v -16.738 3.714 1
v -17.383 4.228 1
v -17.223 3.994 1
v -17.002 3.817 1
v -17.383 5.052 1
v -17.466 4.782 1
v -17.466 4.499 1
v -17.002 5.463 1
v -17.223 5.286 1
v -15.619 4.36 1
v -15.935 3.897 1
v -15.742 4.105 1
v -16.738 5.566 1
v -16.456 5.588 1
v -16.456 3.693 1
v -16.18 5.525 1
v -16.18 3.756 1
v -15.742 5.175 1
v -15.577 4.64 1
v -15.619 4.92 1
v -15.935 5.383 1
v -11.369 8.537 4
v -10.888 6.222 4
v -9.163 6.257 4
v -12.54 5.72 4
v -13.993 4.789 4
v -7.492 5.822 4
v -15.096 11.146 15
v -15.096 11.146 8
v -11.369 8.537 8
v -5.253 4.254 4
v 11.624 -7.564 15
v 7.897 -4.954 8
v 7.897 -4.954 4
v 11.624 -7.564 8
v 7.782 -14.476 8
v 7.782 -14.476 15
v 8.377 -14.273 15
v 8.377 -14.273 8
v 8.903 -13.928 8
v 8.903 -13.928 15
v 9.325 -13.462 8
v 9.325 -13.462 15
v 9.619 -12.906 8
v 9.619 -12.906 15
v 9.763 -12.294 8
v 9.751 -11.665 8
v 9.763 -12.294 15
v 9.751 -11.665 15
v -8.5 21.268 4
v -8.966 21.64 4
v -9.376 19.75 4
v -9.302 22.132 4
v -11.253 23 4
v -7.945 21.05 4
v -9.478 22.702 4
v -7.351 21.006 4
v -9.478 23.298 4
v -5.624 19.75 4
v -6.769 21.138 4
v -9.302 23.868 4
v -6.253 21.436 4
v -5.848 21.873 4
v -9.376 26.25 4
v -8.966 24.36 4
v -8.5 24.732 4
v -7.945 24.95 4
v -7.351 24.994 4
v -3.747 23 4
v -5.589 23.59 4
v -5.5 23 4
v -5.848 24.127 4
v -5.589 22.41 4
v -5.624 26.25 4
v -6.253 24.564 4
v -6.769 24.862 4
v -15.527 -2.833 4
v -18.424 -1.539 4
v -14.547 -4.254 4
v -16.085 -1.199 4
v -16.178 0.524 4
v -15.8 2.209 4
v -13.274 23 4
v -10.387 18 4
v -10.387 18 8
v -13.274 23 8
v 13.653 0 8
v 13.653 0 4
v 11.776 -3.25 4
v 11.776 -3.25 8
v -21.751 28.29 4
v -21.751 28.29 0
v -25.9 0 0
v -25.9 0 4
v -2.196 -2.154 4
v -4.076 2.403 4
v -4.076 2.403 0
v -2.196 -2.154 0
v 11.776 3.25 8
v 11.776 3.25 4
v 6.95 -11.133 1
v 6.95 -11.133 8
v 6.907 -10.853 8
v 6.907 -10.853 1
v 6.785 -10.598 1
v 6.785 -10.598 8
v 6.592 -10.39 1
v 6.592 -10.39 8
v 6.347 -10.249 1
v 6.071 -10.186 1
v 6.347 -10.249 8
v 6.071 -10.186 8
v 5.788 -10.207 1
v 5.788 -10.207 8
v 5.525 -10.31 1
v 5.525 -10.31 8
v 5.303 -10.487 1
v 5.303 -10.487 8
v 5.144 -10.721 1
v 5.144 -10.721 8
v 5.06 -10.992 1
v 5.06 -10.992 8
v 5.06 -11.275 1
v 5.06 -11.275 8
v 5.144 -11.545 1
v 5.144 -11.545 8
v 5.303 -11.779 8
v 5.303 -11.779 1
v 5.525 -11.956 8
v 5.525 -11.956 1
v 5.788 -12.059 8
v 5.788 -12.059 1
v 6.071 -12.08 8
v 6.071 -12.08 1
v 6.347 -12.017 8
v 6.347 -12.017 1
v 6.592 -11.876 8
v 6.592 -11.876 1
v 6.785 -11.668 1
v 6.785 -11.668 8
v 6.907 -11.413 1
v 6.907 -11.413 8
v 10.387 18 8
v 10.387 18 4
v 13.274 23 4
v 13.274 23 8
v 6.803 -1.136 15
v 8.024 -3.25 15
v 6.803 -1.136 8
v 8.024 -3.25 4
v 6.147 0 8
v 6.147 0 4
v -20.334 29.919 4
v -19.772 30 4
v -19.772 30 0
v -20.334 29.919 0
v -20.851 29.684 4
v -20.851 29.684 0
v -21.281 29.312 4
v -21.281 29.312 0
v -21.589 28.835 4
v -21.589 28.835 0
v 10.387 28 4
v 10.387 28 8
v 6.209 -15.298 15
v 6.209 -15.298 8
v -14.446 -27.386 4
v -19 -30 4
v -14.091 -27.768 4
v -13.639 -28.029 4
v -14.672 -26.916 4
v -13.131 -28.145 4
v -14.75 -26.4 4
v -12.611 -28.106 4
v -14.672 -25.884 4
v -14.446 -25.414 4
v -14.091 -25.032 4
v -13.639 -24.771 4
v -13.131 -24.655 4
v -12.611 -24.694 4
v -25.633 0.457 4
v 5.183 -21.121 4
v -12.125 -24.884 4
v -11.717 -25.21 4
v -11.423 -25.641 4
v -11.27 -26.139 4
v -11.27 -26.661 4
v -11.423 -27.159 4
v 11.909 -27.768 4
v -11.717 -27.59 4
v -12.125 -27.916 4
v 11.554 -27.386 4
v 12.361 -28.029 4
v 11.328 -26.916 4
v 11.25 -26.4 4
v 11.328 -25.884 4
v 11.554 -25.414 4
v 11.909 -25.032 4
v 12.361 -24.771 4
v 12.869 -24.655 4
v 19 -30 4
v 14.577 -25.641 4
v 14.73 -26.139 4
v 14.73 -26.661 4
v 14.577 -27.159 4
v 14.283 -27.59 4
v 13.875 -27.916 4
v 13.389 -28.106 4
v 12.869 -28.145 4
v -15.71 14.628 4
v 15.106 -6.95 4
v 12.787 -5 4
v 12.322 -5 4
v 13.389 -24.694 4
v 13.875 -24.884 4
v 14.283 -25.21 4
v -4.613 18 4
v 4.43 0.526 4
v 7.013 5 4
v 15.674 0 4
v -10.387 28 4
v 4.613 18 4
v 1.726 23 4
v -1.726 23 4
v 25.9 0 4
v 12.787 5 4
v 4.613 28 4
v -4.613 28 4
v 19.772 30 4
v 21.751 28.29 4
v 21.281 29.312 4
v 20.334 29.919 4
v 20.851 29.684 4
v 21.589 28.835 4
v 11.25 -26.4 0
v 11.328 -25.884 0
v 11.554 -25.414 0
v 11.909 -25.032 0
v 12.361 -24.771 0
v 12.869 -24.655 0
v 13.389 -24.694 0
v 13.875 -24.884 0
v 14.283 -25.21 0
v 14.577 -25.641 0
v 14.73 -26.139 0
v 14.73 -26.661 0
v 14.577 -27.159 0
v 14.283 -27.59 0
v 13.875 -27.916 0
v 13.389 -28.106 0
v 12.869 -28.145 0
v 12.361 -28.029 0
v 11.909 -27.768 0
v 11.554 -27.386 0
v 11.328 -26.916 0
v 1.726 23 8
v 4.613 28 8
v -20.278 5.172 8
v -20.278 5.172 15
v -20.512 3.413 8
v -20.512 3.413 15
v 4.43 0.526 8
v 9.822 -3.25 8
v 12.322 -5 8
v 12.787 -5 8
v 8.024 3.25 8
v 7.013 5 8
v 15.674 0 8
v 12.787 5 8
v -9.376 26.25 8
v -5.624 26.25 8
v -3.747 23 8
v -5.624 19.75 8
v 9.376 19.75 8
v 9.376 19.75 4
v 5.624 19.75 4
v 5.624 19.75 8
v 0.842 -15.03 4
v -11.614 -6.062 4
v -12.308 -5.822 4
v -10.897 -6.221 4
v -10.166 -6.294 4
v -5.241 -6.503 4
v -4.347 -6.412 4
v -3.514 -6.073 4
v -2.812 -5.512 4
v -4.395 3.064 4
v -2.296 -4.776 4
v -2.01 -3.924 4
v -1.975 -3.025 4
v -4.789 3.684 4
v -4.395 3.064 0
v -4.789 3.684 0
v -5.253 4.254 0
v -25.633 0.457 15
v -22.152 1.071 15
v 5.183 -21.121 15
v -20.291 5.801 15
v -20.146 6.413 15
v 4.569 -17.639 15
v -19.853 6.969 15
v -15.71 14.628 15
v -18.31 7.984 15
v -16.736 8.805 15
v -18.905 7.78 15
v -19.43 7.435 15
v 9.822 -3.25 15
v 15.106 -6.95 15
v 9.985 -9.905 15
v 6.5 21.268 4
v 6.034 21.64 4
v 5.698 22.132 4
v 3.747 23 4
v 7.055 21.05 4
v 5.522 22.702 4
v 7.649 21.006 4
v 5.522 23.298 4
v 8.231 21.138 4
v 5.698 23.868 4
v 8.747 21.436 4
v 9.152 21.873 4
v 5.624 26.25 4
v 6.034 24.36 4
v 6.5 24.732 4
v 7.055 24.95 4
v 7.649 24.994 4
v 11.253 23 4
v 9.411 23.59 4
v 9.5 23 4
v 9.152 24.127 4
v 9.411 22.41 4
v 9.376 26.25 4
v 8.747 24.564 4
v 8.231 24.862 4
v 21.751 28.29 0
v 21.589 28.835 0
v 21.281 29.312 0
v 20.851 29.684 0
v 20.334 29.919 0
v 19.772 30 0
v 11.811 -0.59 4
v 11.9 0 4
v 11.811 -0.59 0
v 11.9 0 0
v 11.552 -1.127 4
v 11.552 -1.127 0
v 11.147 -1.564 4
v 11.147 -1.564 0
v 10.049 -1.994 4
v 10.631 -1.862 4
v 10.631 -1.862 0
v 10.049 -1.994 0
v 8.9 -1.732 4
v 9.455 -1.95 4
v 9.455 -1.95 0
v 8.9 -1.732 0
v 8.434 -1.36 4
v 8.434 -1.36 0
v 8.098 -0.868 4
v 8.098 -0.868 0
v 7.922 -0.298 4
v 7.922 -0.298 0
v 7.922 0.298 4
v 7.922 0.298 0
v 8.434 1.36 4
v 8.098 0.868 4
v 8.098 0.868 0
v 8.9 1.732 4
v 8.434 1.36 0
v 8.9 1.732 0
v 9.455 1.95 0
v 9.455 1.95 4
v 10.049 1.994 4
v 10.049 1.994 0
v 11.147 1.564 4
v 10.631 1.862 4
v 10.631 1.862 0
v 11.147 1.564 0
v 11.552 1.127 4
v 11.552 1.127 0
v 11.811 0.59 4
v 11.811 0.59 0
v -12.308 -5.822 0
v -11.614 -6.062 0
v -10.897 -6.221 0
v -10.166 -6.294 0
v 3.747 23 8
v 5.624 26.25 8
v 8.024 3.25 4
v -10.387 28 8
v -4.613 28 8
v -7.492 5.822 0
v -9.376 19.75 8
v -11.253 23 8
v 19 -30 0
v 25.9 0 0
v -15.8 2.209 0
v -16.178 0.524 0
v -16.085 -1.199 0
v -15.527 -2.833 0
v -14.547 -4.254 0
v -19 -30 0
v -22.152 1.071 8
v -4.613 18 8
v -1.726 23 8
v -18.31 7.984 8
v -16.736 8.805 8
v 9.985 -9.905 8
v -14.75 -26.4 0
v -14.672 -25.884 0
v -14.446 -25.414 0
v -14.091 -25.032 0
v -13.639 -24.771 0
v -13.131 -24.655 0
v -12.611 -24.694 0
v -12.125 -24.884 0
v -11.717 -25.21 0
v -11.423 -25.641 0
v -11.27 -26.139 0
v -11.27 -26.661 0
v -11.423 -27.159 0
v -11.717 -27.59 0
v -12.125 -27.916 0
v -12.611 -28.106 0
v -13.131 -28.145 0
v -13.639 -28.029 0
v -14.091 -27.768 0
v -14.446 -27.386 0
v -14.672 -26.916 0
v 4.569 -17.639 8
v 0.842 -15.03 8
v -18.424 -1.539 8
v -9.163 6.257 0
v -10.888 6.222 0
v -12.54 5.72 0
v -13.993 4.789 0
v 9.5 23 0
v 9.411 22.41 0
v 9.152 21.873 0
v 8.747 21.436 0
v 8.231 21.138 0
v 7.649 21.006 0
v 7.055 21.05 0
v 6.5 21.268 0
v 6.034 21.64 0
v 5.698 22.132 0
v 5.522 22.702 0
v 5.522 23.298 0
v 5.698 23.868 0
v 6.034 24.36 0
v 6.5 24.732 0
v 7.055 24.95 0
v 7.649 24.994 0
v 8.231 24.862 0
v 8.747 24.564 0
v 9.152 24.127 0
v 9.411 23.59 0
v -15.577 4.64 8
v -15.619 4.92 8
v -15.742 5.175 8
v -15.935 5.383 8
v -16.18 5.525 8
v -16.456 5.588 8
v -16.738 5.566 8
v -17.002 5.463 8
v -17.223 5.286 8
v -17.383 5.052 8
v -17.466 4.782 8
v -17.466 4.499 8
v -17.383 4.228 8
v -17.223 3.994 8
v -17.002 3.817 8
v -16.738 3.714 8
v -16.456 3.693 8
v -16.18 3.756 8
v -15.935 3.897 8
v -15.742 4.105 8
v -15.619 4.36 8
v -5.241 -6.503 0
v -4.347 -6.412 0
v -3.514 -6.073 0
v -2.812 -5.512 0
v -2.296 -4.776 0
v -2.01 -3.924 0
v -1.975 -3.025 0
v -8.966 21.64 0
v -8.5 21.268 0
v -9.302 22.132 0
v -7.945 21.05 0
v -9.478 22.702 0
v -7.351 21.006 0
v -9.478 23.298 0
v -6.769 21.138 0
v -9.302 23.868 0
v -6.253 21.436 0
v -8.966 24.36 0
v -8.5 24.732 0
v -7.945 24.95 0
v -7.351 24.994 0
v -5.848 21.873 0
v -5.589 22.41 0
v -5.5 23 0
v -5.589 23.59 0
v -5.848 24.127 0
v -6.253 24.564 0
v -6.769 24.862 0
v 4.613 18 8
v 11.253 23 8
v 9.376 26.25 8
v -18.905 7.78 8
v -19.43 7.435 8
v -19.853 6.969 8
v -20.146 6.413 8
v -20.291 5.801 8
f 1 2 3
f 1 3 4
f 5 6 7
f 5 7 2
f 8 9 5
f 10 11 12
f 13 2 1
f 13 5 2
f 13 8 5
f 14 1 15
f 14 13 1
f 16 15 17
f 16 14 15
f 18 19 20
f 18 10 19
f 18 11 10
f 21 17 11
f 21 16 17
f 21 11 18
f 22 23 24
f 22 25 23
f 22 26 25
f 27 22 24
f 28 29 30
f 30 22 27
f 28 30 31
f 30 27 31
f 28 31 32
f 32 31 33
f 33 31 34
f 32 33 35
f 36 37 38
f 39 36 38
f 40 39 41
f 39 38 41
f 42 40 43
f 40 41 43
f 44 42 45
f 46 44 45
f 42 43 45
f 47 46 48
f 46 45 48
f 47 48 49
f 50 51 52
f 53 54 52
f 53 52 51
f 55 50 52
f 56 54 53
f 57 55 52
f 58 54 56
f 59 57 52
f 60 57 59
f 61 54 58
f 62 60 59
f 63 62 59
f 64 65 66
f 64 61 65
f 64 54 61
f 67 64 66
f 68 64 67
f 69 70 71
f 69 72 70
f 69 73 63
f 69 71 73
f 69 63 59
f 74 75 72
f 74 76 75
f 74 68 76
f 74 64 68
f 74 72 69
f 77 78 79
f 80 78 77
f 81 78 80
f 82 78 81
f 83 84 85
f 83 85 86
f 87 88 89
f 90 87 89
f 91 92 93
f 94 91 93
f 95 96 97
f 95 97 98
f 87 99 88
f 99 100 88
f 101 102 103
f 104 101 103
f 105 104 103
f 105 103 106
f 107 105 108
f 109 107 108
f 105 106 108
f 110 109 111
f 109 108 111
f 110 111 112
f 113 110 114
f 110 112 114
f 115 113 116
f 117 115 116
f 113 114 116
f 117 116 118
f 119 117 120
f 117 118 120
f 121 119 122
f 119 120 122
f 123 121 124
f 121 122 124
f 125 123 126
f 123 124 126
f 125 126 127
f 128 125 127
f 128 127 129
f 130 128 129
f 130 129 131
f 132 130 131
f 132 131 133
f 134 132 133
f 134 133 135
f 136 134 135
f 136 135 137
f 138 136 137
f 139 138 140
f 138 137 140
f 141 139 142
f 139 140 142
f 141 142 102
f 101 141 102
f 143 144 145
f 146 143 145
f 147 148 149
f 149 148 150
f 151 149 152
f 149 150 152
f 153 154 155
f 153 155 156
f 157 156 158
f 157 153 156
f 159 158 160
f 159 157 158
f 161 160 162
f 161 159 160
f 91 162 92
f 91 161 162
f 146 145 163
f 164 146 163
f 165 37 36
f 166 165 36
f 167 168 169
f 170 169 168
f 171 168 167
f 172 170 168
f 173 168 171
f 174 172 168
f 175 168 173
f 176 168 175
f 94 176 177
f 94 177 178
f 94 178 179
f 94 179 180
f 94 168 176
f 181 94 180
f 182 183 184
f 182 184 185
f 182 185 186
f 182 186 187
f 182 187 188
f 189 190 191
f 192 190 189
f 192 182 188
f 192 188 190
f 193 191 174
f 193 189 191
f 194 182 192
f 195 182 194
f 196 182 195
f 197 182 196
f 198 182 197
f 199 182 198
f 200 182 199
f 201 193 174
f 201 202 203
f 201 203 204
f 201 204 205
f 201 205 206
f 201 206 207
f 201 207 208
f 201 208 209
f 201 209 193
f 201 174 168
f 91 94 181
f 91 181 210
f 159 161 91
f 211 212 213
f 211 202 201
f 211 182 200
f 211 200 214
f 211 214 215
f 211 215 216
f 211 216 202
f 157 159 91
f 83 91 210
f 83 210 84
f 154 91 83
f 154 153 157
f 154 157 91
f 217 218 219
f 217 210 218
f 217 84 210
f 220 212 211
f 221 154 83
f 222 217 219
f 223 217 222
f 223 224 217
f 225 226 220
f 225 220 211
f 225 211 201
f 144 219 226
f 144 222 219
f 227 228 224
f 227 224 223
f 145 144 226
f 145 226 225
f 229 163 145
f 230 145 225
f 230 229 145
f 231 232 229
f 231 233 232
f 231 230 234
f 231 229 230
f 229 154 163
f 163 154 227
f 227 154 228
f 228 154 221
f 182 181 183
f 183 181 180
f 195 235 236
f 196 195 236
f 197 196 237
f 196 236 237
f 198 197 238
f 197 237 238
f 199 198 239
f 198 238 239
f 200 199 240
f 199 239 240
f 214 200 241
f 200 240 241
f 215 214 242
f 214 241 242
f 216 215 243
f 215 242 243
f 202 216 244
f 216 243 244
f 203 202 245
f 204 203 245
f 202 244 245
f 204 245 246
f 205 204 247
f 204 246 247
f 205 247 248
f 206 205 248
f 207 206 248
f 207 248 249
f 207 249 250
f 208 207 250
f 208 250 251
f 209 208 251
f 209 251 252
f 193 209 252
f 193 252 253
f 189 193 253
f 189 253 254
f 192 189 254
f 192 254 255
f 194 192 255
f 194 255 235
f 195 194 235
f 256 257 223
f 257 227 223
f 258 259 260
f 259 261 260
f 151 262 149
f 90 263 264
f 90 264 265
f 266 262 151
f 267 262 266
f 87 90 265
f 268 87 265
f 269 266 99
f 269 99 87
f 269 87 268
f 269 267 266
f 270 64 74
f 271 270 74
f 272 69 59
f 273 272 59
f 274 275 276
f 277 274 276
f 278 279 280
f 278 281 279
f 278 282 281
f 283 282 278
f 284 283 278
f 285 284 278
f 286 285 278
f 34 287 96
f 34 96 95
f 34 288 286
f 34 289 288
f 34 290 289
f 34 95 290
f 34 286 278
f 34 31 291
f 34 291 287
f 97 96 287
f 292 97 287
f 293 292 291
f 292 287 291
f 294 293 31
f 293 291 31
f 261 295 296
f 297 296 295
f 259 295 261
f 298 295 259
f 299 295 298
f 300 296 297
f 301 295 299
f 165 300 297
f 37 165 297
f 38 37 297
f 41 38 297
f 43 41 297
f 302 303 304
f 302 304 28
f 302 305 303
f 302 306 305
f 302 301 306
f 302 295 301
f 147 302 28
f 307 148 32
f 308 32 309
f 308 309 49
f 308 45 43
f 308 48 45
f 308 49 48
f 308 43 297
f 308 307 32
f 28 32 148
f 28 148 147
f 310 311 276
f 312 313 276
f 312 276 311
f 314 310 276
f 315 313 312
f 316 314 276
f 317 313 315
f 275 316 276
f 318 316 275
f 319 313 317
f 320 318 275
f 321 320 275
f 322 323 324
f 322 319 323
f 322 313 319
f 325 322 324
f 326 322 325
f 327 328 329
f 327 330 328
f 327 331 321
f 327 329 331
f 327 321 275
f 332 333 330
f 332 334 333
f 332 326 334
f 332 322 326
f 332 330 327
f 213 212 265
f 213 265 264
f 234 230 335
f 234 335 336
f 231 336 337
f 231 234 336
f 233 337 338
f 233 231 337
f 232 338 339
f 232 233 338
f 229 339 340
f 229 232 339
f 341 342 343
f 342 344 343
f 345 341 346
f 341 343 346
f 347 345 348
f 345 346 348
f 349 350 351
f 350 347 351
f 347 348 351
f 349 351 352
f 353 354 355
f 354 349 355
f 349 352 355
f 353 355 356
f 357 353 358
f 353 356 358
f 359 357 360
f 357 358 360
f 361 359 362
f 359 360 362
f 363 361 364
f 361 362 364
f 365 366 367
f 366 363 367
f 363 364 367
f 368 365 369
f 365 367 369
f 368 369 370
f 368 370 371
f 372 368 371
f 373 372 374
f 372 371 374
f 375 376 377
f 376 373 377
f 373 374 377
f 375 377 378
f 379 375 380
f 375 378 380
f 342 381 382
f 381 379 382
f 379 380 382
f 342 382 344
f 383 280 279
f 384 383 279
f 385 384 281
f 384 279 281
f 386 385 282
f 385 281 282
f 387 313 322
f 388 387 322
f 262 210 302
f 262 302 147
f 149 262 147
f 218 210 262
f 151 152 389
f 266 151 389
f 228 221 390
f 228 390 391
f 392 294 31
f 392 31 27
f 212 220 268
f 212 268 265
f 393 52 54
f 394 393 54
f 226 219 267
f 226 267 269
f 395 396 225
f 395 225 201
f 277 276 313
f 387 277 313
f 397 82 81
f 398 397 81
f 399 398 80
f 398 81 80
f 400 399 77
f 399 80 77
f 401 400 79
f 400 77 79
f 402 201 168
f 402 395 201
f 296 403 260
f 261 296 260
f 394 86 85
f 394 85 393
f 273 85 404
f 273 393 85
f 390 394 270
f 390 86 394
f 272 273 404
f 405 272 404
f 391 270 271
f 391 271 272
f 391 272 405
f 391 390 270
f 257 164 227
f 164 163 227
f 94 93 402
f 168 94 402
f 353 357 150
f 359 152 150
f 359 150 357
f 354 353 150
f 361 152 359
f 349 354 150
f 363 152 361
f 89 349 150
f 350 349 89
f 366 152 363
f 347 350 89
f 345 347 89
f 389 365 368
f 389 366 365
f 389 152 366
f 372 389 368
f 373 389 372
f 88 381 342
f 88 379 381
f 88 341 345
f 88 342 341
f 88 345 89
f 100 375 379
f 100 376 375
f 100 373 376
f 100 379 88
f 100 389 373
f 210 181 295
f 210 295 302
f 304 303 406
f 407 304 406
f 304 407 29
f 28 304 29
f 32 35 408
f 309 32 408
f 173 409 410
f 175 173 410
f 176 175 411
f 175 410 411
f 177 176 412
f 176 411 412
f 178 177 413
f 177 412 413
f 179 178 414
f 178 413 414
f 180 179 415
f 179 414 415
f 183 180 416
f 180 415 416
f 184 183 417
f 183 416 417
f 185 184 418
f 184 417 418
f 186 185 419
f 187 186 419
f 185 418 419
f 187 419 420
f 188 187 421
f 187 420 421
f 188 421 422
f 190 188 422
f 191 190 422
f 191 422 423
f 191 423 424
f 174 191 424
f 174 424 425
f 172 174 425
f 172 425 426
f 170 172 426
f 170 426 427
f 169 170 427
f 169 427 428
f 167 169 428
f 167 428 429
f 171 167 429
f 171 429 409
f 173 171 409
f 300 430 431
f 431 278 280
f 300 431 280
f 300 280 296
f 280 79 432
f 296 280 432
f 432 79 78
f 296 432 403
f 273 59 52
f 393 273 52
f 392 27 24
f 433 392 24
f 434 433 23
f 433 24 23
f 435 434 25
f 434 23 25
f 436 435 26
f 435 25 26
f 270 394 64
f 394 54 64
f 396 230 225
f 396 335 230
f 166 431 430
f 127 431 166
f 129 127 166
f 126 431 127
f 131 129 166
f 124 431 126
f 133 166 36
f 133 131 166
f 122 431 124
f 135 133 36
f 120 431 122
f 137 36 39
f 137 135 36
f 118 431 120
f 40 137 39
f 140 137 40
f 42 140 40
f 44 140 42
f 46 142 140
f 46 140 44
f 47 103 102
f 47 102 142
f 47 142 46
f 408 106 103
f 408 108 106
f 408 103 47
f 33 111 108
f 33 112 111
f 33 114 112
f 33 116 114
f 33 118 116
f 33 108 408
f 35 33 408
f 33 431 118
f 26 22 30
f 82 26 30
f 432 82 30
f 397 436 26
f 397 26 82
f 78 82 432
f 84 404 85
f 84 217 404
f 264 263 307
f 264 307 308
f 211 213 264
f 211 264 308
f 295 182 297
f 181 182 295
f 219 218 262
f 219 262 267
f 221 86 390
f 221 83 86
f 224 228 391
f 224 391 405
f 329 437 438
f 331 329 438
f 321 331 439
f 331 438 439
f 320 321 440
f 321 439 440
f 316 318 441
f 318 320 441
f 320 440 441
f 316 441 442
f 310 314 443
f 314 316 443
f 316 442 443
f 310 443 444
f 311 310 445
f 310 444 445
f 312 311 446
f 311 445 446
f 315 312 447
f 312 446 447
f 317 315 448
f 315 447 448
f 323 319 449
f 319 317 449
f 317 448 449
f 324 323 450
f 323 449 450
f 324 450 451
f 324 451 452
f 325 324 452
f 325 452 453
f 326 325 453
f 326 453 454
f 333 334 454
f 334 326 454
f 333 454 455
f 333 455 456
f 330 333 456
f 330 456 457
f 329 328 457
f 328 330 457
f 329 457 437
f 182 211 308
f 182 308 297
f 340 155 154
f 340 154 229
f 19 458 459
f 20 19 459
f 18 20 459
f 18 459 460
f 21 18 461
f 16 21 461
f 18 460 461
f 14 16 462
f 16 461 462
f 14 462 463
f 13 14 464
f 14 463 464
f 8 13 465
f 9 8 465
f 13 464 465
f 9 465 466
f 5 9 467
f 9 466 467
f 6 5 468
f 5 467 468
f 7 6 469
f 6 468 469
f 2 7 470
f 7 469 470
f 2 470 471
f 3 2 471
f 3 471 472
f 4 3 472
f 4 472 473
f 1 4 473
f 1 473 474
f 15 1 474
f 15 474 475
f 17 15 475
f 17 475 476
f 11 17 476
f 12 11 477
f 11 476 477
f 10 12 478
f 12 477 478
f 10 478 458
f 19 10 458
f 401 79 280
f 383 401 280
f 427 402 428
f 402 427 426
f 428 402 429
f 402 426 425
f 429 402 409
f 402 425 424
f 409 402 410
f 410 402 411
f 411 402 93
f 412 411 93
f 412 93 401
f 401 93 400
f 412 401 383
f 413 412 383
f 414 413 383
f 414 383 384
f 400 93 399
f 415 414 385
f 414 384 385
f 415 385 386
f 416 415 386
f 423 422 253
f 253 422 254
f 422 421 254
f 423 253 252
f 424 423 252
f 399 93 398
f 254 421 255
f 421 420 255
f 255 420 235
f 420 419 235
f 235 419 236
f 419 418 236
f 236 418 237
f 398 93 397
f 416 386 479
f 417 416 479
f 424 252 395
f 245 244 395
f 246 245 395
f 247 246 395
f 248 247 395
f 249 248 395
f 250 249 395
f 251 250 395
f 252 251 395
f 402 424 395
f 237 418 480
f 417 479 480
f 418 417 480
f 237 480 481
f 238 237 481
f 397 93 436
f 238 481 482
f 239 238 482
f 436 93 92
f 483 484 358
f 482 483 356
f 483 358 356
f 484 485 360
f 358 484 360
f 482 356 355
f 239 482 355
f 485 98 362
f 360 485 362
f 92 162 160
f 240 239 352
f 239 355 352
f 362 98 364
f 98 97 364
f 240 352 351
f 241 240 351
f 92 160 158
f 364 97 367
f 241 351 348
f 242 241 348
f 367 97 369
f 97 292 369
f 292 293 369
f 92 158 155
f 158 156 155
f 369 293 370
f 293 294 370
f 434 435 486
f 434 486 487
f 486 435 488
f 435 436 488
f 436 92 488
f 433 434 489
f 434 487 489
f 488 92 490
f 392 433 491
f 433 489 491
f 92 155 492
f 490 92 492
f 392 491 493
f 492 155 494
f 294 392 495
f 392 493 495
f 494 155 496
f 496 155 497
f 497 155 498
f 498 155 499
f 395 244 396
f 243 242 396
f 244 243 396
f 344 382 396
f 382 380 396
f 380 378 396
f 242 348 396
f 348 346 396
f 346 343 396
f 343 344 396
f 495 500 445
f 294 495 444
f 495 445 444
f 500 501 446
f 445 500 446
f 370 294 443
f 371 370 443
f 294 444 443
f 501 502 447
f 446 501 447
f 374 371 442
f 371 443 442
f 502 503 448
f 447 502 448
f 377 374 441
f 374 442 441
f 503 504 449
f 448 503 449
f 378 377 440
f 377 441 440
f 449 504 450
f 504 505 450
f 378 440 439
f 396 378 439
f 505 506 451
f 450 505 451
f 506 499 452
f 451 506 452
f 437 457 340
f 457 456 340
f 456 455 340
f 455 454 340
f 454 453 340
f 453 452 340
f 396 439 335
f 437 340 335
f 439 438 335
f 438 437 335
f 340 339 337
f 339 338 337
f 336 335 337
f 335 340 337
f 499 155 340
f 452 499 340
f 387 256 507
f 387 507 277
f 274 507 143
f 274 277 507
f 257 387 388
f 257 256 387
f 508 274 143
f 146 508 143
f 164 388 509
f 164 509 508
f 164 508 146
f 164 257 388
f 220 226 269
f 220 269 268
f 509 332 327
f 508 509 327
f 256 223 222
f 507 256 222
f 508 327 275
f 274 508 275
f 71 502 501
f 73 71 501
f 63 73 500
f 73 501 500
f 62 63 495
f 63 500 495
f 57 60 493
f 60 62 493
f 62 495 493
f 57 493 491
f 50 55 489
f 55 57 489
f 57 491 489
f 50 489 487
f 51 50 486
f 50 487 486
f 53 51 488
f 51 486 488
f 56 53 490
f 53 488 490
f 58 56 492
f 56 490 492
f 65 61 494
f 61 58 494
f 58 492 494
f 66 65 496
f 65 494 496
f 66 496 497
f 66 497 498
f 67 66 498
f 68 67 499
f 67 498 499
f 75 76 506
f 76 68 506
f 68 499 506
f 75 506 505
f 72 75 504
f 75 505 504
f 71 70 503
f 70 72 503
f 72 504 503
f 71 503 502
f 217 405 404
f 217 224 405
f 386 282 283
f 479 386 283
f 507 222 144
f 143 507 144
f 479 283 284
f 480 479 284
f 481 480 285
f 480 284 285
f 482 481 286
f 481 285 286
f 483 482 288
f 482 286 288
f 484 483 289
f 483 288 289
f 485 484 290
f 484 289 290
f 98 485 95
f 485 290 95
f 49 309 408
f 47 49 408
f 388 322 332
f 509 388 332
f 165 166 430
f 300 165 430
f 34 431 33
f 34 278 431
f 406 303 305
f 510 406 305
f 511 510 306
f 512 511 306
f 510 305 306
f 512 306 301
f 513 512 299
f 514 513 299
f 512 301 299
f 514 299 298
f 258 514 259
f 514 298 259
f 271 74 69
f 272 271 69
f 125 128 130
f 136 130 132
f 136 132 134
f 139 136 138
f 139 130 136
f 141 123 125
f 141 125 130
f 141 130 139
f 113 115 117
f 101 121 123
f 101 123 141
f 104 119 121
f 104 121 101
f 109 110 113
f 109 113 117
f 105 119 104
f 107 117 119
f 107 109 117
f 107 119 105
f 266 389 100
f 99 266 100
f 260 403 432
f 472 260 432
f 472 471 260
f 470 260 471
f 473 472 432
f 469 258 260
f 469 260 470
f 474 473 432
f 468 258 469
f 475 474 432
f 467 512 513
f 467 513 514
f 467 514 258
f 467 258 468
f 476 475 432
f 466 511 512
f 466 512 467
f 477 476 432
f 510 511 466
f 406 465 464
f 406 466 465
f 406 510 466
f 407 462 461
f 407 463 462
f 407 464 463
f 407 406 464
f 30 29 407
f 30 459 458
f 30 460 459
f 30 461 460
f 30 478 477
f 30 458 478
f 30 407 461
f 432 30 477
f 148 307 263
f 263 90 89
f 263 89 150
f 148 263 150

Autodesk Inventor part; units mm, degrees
ref_plane "YZ Plane" through (0, 0, 0) normal (1, 0, 0) x (0, 1, 0)
ref_plane "XZ Plane" through (0, 0, 0) normal (0, 1, 0) x (-1, 0, 0)
sketch "Sketch1" plane through (0, 0, 0) normal (0, 0, 1) x (1, 0, 0)
  circle A0 centre (-7.5, 23) radius 2
  circle A1 centre (-9.9, 0) radius 2
  line L0 (0, 30) -> (-21.5, 30)
  line L1 (-21.5, 30) -> (-25.9, 0)
  line L2 (-25.9, 0) -> (-19, -30)
  line L3 (-19, -30) -> (0, -30)
  line L4 (0, -30) -> (0, 30) construction
  line L5 (-9.9, 0) -> (0, 0)
  line L6 (0, 30) -> (21.5, 30)
  line L7 (21.5, 30) -> (25.9, 0)
  line L8 (25.9, 0) -> (19, -30)
  line L9 (19, -30) -> (0, -30)
  circle A2 centre (7.5, 23) radius 2
  circle A3 centre (9.9, 0) radius 2
  dimension "d0" = 4
  dimension "d1" = 4
  dimension "d3" = 14
  dimension "d6" = 16
  dimension "d7" = 7
  dimension "d8" = 19
  dimension "d9" = 30
  dimension "d10" = 30
  dimension "d11" = 19
  dimension "d12" = 21.5
  dimension "d13" = 4
  dimension "d14" = 7
  dimension "d15" = 7.5
  dimension "d16" = 30
  dimension "d17" = 30
  dimension "d18" = 4
  dimension "d20" = 16
  dimension "d47" = 9.9
  dimension "d79" = 9.9
  dimension "d98" = 7.5
extrude "Extrusion1" add sketch "Sketch1" along normal blind 4
fillet "Fillet1" radius 2 2 edges at (-21.5, 30, 2) (21.5, 30, 2)
ref_plane "Work Plane1" through (0, 176.5909, 4) normal (1, 0, 0) x (0, 0, -1)
sketch "Sketch2" plane through (0, 0, 4) normal (0, 0, 1) x (1, 0, 0)
  circle A0 centre (-9.9, 0) radius 2 projected
  line L0 (-15.7104, 14.6282) -> (15.1061, -6.9498)
  line L1 (15.1061, -6.9498) -> (5.1832, -21.1211)
  line L2 (5.1832, -21.1211) -> (-25.6333, 0.4569)
  line L3 (-25.6333, 0.4569) -> (-15.7104, 14.6282)
  line L4 (-20.6718, 7.5425) -> (10.1447, -14.0354) construction
  line L5 (-15.0965, 11.1464) -> (11.6243, -7.5637)
  line L6 (11.6243, -7.5637) -> (4.5693, -17.6393)
  line L7 (4.5693, -17.6393) -> (-22.1515, 1.0708)
  line L8 (-22.1515, 1.0708) -> (-15.0965, 11.1464)
  line L9 (-15.0965, 11.1464) -> (-11.3693, 8.5366)
  line L10 (-11.3693, 8.5366) -> (-18.4243, -1.539)
  line L11 (-18.4243, -1.539) -> (-22.1515, 1.0708)
  line L12 (-22.1515, 1.0708) -> (-15.0965, 11.1464)
  line L13 (4.5693, -17.6393) -> (0.8421, -15.0295)
  line L14 (7.8971, -4.9539) -> (11.6243, -7.5637)
  line L15 (11.6243, -7.5637) -> (4.5693, -17.6393)
  line L16 (0, 42) -> (0, -42) projected
  line L17 (0.8421, -15.0295) -> (7.8971, -4.9539)
  dimension "d34" = 37.62
  dimension "d35" = 17.3
  dimension "d36" = 2.5
  dimension "d37" = 2.5
  dimension "d38" = 2.5
  dimension "d40" = 2.5
  dimension "d42" = 4.55
  dimension "d44" = 55
  dimension "d45" = 6.15
  dimension "d46" = 4.55
  dimension "d78" = 6.1
extrude "Extrusion2" add sketch "Sketch2" along normal blind 4 contours L10 L7 L8 L5 | L5 L6 L7 L17
extrude "Extrusion3" add sketch "Sketch2" along normal blind 11 contours L0 L16 L5 L8 L7 L2 L3 | L0 L1 L2 L16 L7 L6 L5
sketch "Sketch3" plane through (0, 0, 15) normal (0, 0, 1) x (1, 0, 0)
  line L0 (-15.7104, 14.6282) -> (-25.6333, 0.4569) projected
  line L1 (-25.6333, 0.4569) -> (5.1832, -21.1211) projected
  line L2 (5.1832, -21.1211) -> (15.1061, -6.9498) projected
  line L3 (15.1061, -6.9498) -> (-15.7104, 14.6282) projected
  line L4 (-15.0965, 11.1464) -> (11.6243, -7.5637) projected
  line L5 (11.6243, -7.5637) -> (4.5693, -17.6393) projected
  line L6 (4.5693, -17.6393) -> (-22.1515, 1.0708) projected
  line L7 (-22.1515, 1.0708) -> (-15.0965, 11.1464) projected
  line L8 (-18.624, 6.1086) -> (8.0968, -12.6015) construction
  circle A0 centre (-16.5269, 4.6402) radius 0.95
  circle A1 centre (5.9997, -11.1331) radius 0.95
  line L9 (-18.4243, -1.539) -> (-11.3693, 8.5366) projected
  line L10 (7.8971, -4.9539) -> (0.8421, -15.0295) projected
  arc A2 (-15.8617, 3.9621) -> (-17.3097, 7.9855) centre (-17.8048, 5.535) ccw construction
  arc A3 (6.7825, -14.4784) -> (9.411, -10.7246) centre (7.2776, -12.0279) ccw
  arc A4 (-19.9382, 4.2317) -> (-15.8617, 3.9621) centre (-17.8048, 5.535) ccw construction
  arc A5 (-17.3097, 7.9855) -> (-19.9382, 4.2317) centre (-17.8048, 5.535) ccw
  arc A6 (5.1349, -10.7399) -> (6.7825, -14.4784) centre (7.2776, -12.0279) ccw construction
  arc A7 (9.411, -10.7246) -> (5.1349, -10.7399) centre (7.2776, -12.0279) ccw construction
  point P0 (0, 0)
  dimension "d52" = 1.9
  dimension "d53" = 1.9
  dimension "d54" = 1.99
  dimension "d55" = 1.99
  dimension "d56" = 5
  dimension "d57" = 3.5
  dimension "d58" = 5
  dimension "d59" = 3.5
extrude "Extrusion4" cut sketch "Sketch3" against normal up to surface (7 mm away) contours L7 A5 | A3 L5
chamfer "Chamfer1" distance 1 angle 45 4 edges at (-17.3097, 7.9855, 11.5) (-19.9382, 4.2317, 11.5) (6.7825, -14.4784, 11.5) (9.411, -10.7246, 11.5)
extrude "Extrusion5" cut sketch "Sketch3" against normal blind 14 contours A0 | A1
sketch "Sketch4" plane through (0, 0, 4) normal (0, 0, 1) x (1, 0, 0)
  circle A0 centre (-9.9, 0) radius 2 projected
  line L0 (-18.4243, -1.539) -> (-11.3693, 8.5366) projected
  line L1 (-18.4243, -1.539) -> (0.8421, -15.0295) projected
  line L2 (0.8421, -15.0295) -> (7.8971, -4.9539) projected
  line L3 (7.8971, -4.9539) -> (-11.3693, 8.5366) projected
  line L4 (-11.3693, 8.5366) -> (-18.4243, -1.539) projected
  circle A1 centre (-9.9, 0) radius 2 projected
  arc A2 (-7.2134, -5.6984) -> (-4.0762, 2.4029) centre (-9.9, 0) ccw construction
  arc A3 (-5.241, -6.5026) -> (-2.1961, -2.154) centre (-5.108, -3.3554) ccw
  line L5 (-4.0762, 2.4029) -> (-2.1961, -2.154)
  line L6 (-10.1661, -6.2944) -> (-5.241, -6.5026)
  line L7 (-14.8968, 3.4988) -> (4.3696, -9.9917) construction
  arc A4 (-10.1661, -6.2944) -> (-7.2134, -5.6984) centre (-9.9, 0) ccw construction
  arc A5 (-7.2134, -5.6984) -> (-5.241, -6.5026) centre (-5.108, -3.3554) ccw construction
  arc A6 (-4.0762, 2.4029) -> (-10.1661, -6.2944) centre (-9.9, 0) ccw
  arc A7 (-2.1961, -2.154) -> (-7.2134, -5.6984) centre (-5.108, -3.3554) ccw construction
  point P0 (0, 0)
  point P1 (-5.2531, 4.254)
  point P2 (-7.4919, 5.8216)
  point P3 (-13.9936, 4.7888)
  point P4 (-15.8001, 2.2088)
  point P5 (-14.5469, -4.254)
  point P6 (-12.3081, -5.8216)
  dimension "d73" = 12.6
  dimension "d74" = 6.3
  dimension "d75" = 5.85
extrude "Extrusion6" cut sketch "Sketch4" against normal through all contours L0 A6 L3 L5 A3 L6 L1
sketch "Sketch5" plane through (0, 0, 4) normal (0, 0, 1) x (1, 0, 0)
  circle A0 centre (-7.5, 23) radius 2 projected
  circle A1 centre (7.5, 23) radius 2 projected
  circle A2 centre (9.9, 0) radius 2 projected
  line L0 (-5.6236, 26.25) -> (-3.7472, 23)
  line L1 (-3.7472, 23) -> (-5.6236, 19.75)
  line L2 (-5.6236, 19.75) -> (-9.3764, 19.75)
  line L3 (-9.3764, 19.75) -> (-11.2528, 23)
  line L4 (-11.2528, 23) -> (-9.3764, 26.25)
  line L5 (-9.3764, 26.25) -> (-5.6236, 26.25)
  line L6 (9.3764, 26.25) -> (11.2528, 23)
  line L7 (11.2528, 23) -> (9.3764, 19.75)
  line L8 (9.3764, 19.75) -> (5.6236, 19.75)
  line L9 (5.6236, 19.75) -> (3.7472, 23)
  line L10 (3.7472, 23) -> (5.6236, 26.25)
  line L11 (5.6236, 26.25) -> (9.3764, 26.25)
  line L12 (11.7764, 3.25) -> (13.6528, 0)
  line L13 (13.6528, 0) -> (11.7764, -3.25)
  line L14 (11.7764, -3.25) -> (8.0236, -3.25)
  line L15 (8.0236, -3.25) -> (6.1472, 0)
  line L16 (6.1472, 0) -> (8.0236, 3.25)
  line L17 (8.0236, 3.25) -> (11.7764, 3.25)
  line L18 (-4.6132, 28) -> (-1.7265, 23)
  line L19 (-1.7265, 23) -> (-4.6132, 18)
  line L20 (-4.6132, 18) -> (-10.3868, 18)
  line L21 (-10.3868, 18) -> (-13.2735, 23)
  line L22 (-13.2735, 23) -> (-10.3868, 28)
  line L23 (-10.3868, 28) -> (-4.6132, 28)
  line L24 (4.6132, 18) -> (10.3868, 18)
  line L25 (10.3868, 18) -> (13.2735, 23)
  line L26 (13.2735, 23) -> (10.3868, 28)
  line L27 (10.3868, 28) -> (4.6132, 28)
  line L28 (4.6132, 28) -> (1.7265, 23)
  line L29 (1.7265, 23) -> (4.6132, 18)
  line L30 (12.7868, 5) -> (15.6735, 0)
  line L31 (15.6735, 0) -> (12.7868, -5)
  line L32 (12.7868, -5) -> (7.9629, -5)
  line L33 (7.0132, -5) -> (6.3688, -3.8838) construction
  line L34 (4.1265, 0) -> (7.0132, 5)
  line L35 (7.0132, 5) -> (12.7868, 5)
  line L36 (-15.0965, 11.1464) -> (11.6243, -7.5637) projected
  line L37 (6.3688, -3.8838) -> (4.1265, 0)
  line L38 (7.9629, -5) -> (7.0132, -5) construction
  point P0 (0, 0)
  point P1 (9.9, 3.25)
  dimension "d80" = 6.5
  dimension "d81" = 6.5
  dimension "d82" = 6.5
  dimension "d85" = 10
  dimension "d86" = 10
  dimension "d87" = 10
extrude "Extrusion7" cut sketch "Sketch5" along normal through all contours A2 | L12 L13 L14 L15 L16 L17
extrude "Extrusion8" add sketch "Sketch5" along normal blind 4 contours L18 L19 L20 L21 L22 L23 | L29 L28 L27 L26 L25 L24 | L30 L31 L32 L36 L37 L34 L35
sketch "Sketch6" plane through (0, 0, 0) normal (0, 0, -1) x (-1, 0, 0)
  circle A0 centre (-13, -26.4) radius 1.75
  circle A1 centre (13, -26.4) radius 1.75
  line L0 (19, -30) -> (-19, -30) projected
  point P0 (0, 0)
  dimension "d90" = 3.5
  dimension "d91" = 3.5
  dimension "d92" = 26
  dimension "d93" = 13
  dimension "d94" = 3.6
  dimension "d95" = 3.6
extrude "Extrusion9" cut sketch "Sketch6" against normal through all
equation "\"d1\" = d0"
equation "\"d11\" = d8"
equation "\"d13\" = d0"
equation "\"d14\" = d7"
equation "\"d18\" = d0"
equation "\"d47\" = d79"
equation "\"d81\" = d80"
equation "\"d82\" = d81"
equation "\"d86\" = d85"
equation "\"d87\" = d86"
equation "\"d95\" = d94"
properties part number "head"
